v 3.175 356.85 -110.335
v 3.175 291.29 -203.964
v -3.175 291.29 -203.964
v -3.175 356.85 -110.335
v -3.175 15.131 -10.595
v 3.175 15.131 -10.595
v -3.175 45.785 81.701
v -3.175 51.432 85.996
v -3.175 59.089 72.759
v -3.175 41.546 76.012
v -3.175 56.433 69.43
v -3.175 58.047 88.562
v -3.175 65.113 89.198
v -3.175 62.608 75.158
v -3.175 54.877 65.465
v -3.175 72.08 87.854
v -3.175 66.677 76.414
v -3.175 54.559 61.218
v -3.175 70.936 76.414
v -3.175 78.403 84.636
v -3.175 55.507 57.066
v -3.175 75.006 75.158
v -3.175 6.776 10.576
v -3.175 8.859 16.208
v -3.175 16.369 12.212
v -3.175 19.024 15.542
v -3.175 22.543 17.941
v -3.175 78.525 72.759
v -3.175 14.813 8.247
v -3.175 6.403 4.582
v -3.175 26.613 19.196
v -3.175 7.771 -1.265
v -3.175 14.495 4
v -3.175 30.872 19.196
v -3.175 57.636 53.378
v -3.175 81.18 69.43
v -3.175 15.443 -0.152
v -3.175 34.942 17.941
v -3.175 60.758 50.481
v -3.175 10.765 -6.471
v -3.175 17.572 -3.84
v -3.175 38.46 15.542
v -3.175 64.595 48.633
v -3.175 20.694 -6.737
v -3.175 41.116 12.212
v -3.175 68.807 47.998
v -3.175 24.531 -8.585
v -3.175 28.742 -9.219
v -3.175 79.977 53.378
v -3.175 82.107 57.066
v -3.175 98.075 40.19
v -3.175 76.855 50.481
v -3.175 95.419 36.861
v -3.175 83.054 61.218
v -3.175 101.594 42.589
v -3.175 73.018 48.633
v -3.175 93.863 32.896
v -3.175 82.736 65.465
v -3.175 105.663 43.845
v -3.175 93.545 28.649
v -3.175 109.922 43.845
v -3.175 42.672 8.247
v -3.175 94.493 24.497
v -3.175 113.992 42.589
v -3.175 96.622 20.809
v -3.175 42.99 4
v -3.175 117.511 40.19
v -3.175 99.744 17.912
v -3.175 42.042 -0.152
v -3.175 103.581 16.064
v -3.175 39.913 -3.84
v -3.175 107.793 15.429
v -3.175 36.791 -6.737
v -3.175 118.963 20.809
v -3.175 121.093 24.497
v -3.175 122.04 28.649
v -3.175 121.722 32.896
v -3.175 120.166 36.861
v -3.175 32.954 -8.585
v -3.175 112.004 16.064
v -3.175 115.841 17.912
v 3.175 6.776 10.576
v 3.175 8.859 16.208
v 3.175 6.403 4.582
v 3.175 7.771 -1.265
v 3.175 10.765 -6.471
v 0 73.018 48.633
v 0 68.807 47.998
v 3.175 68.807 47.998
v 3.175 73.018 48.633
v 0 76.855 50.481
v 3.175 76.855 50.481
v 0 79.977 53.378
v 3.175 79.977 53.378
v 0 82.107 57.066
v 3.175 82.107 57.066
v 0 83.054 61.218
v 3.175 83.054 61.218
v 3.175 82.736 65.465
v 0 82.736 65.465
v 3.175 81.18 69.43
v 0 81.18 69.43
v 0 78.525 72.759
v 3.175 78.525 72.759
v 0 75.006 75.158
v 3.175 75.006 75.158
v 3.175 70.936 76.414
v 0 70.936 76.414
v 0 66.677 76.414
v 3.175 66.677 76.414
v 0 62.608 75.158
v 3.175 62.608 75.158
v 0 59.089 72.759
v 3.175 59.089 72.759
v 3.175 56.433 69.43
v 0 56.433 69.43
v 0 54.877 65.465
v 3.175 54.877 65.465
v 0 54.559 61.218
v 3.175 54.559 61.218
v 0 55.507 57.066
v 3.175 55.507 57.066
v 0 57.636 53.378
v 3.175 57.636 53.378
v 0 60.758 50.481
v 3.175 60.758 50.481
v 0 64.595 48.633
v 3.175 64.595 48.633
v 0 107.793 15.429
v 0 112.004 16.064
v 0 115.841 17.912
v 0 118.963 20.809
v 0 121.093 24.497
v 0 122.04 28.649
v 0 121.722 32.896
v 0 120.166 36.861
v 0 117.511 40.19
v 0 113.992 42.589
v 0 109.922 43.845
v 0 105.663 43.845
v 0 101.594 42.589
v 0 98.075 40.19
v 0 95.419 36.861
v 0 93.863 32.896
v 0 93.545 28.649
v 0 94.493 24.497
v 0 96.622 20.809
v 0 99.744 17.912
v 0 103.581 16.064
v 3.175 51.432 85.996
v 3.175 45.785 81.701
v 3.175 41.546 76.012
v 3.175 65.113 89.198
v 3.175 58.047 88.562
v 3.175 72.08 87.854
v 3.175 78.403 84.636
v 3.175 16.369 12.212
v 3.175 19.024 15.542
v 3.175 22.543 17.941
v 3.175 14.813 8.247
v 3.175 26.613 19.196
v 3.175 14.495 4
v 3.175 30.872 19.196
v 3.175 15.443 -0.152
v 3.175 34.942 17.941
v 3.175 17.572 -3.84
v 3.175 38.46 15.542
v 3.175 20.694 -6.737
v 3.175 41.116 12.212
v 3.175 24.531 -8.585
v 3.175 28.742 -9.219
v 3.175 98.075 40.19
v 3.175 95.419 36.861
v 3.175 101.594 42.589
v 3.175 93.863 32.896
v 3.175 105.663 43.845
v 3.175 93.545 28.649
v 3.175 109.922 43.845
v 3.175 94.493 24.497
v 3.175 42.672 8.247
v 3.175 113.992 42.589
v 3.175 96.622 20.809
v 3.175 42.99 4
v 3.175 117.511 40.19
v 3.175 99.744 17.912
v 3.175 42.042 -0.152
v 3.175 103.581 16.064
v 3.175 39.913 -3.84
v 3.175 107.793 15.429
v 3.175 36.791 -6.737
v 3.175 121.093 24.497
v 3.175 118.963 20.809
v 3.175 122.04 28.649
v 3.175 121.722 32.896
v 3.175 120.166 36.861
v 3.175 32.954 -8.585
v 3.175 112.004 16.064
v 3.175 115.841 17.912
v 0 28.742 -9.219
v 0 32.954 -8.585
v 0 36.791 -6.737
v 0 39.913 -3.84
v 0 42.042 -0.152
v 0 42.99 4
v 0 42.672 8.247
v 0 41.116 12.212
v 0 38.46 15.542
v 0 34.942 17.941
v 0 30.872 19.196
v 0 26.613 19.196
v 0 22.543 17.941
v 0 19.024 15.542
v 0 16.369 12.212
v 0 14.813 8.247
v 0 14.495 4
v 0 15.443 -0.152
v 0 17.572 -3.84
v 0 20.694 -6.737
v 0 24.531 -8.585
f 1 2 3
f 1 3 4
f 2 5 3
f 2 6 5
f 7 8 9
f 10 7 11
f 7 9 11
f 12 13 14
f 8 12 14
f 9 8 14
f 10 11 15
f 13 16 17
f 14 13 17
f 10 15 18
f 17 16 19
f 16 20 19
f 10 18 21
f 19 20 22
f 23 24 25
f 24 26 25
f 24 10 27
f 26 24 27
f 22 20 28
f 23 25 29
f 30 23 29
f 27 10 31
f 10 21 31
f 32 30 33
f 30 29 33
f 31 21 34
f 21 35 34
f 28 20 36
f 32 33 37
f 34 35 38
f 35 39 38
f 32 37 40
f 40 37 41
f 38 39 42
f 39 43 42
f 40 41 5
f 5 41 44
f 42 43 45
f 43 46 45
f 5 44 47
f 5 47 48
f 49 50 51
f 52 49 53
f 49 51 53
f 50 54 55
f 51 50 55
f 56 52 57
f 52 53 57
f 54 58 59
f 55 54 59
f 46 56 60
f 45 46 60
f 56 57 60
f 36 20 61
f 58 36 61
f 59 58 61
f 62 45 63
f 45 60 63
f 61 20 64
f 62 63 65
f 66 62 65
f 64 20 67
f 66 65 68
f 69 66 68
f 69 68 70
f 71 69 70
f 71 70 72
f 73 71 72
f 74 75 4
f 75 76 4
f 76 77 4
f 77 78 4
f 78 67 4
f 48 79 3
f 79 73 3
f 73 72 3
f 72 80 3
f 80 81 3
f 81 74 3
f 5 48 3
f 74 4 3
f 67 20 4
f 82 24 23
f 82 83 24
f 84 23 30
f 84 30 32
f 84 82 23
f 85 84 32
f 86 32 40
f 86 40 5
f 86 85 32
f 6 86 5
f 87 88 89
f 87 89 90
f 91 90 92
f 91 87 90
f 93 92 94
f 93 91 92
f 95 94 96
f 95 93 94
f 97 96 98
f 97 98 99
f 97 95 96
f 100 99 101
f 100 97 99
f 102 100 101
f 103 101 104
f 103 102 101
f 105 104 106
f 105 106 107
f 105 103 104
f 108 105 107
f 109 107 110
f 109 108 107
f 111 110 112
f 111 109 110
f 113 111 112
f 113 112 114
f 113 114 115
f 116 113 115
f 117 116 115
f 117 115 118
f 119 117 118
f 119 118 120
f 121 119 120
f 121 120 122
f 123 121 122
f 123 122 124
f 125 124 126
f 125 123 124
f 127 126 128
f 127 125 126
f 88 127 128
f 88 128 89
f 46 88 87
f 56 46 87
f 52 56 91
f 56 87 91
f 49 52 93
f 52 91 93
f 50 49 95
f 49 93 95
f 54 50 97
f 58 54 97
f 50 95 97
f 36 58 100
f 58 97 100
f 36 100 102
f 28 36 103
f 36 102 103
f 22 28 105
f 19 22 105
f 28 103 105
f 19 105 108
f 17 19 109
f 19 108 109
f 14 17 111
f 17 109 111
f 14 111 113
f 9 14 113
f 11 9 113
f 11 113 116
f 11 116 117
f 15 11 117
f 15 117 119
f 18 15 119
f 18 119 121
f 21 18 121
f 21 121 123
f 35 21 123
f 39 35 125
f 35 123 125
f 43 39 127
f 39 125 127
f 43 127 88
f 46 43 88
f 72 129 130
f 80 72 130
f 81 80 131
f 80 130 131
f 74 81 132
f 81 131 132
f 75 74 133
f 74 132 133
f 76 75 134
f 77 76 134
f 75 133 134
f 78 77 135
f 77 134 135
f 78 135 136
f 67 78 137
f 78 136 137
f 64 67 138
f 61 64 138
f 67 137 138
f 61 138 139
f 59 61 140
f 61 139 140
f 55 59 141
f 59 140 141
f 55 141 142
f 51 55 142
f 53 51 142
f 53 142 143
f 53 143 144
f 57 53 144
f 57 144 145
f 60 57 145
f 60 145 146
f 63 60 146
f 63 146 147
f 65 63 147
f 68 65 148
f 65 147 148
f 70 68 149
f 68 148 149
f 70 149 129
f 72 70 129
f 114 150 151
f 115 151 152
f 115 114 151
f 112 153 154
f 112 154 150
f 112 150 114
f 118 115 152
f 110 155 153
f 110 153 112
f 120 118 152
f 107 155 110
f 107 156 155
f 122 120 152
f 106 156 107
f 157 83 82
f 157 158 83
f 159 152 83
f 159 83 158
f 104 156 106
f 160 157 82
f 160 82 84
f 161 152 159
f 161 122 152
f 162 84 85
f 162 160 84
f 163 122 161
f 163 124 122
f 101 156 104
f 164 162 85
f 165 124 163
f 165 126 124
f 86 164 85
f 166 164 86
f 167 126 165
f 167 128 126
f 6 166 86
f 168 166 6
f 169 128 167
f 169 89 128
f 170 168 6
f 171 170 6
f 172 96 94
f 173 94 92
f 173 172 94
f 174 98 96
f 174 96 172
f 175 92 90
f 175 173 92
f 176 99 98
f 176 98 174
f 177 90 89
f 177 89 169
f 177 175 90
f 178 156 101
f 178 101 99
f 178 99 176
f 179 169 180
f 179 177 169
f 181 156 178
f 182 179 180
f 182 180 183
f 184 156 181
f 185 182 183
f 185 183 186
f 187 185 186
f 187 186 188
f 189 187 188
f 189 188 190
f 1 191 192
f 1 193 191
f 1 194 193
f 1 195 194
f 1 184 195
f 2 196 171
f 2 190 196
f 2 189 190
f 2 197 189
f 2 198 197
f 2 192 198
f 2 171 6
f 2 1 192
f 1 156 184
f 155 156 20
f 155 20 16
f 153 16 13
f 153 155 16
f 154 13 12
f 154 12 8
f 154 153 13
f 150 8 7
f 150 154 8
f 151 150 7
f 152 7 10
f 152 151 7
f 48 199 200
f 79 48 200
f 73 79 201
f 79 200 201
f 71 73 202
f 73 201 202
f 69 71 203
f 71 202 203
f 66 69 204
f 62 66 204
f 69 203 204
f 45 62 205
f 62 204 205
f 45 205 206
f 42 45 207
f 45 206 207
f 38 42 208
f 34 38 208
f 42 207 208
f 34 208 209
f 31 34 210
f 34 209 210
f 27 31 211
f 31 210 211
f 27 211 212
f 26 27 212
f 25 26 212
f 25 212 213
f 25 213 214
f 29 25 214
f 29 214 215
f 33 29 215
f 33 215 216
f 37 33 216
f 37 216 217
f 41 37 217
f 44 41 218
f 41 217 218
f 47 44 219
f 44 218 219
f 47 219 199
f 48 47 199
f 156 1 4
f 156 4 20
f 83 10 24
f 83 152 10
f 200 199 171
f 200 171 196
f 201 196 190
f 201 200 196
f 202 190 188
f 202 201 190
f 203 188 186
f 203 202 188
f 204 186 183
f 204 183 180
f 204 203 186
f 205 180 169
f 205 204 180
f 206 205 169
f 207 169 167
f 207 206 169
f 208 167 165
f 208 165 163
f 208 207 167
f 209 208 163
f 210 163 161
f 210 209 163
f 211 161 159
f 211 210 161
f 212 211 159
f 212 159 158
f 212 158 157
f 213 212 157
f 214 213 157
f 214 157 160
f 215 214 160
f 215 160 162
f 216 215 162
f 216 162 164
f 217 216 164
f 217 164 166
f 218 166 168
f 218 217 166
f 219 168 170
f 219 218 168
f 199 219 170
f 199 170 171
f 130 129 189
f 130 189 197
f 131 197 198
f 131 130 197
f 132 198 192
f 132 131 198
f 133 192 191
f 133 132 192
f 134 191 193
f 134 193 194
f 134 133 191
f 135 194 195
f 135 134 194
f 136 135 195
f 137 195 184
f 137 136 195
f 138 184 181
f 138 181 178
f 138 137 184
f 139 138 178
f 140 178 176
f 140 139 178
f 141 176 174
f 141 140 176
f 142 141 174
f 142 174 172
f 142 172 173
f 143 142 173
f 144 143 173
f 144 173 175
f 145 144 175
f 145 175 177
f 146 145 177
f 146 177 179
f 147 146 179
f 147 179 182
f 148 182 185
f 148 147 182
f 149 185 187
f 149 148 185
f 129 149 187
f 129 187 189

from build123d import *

# Parameters (mm, degrees)
BOSS_EXTRUDE2_DEPTH      = 3.175
BOSS_EXTRUDE2_DEPTH_BACK = 3.175
SKETCH1_R                = 14.2875


with BuildPart() as part:
    # Sketch1 → Boss-Extrude2 (new, two sides: drawn at the far end of the back side and taken through both)
    with BuildSketch(Plane(origin=(0, 0, 0), x_dir=(0, 0, -1), z_dir=(1, 0, 0)).offset(-BOSS_EXTRUDE2_DEPTH_BACK)):
        with BuildLine():
            Line((10.594785966, 15.13092246), (203.963780766, 291.290466949))
            Line((203.963780766, 291.290466949), (110.334702104, 356.850253624))
            Line((110.334702104, 356.850253624), (-84.6362425, 78.402887714))
            ThreePointArc((-84.6362425, 78.402887714), (-88.561708566, 58.046841565), (-76.011825816, 41.54598275))
            Line((-76.011825816, 41.54598275), (-16.208376106, 8.859054586))
            ThreePointArc((-16.208376106, 8.859054586), (-1.608360556, 6.873414672), (10.594785966, 15.13092246))
        make_face()
        with Locations((-62.285836902, 68.806748098)):
            Circle(SKETCH1_R, mode=Mode.SUBTRACT)
        with Locations((-5.068066609, 28.742434019)):
            Circle(SKETCH1_R, mode=Mode.SUBTRACT)
        with Locations((-29.716861807, 107.792666854)):
            Circle(SKETCH1_R, mode=Mode.SUBTRACT)
    extrude(amount=BOSS_EXTRUDE2_DEPTH + BOSS_EXTRUDE2_DEPTH_BACK)


solid = part.part
